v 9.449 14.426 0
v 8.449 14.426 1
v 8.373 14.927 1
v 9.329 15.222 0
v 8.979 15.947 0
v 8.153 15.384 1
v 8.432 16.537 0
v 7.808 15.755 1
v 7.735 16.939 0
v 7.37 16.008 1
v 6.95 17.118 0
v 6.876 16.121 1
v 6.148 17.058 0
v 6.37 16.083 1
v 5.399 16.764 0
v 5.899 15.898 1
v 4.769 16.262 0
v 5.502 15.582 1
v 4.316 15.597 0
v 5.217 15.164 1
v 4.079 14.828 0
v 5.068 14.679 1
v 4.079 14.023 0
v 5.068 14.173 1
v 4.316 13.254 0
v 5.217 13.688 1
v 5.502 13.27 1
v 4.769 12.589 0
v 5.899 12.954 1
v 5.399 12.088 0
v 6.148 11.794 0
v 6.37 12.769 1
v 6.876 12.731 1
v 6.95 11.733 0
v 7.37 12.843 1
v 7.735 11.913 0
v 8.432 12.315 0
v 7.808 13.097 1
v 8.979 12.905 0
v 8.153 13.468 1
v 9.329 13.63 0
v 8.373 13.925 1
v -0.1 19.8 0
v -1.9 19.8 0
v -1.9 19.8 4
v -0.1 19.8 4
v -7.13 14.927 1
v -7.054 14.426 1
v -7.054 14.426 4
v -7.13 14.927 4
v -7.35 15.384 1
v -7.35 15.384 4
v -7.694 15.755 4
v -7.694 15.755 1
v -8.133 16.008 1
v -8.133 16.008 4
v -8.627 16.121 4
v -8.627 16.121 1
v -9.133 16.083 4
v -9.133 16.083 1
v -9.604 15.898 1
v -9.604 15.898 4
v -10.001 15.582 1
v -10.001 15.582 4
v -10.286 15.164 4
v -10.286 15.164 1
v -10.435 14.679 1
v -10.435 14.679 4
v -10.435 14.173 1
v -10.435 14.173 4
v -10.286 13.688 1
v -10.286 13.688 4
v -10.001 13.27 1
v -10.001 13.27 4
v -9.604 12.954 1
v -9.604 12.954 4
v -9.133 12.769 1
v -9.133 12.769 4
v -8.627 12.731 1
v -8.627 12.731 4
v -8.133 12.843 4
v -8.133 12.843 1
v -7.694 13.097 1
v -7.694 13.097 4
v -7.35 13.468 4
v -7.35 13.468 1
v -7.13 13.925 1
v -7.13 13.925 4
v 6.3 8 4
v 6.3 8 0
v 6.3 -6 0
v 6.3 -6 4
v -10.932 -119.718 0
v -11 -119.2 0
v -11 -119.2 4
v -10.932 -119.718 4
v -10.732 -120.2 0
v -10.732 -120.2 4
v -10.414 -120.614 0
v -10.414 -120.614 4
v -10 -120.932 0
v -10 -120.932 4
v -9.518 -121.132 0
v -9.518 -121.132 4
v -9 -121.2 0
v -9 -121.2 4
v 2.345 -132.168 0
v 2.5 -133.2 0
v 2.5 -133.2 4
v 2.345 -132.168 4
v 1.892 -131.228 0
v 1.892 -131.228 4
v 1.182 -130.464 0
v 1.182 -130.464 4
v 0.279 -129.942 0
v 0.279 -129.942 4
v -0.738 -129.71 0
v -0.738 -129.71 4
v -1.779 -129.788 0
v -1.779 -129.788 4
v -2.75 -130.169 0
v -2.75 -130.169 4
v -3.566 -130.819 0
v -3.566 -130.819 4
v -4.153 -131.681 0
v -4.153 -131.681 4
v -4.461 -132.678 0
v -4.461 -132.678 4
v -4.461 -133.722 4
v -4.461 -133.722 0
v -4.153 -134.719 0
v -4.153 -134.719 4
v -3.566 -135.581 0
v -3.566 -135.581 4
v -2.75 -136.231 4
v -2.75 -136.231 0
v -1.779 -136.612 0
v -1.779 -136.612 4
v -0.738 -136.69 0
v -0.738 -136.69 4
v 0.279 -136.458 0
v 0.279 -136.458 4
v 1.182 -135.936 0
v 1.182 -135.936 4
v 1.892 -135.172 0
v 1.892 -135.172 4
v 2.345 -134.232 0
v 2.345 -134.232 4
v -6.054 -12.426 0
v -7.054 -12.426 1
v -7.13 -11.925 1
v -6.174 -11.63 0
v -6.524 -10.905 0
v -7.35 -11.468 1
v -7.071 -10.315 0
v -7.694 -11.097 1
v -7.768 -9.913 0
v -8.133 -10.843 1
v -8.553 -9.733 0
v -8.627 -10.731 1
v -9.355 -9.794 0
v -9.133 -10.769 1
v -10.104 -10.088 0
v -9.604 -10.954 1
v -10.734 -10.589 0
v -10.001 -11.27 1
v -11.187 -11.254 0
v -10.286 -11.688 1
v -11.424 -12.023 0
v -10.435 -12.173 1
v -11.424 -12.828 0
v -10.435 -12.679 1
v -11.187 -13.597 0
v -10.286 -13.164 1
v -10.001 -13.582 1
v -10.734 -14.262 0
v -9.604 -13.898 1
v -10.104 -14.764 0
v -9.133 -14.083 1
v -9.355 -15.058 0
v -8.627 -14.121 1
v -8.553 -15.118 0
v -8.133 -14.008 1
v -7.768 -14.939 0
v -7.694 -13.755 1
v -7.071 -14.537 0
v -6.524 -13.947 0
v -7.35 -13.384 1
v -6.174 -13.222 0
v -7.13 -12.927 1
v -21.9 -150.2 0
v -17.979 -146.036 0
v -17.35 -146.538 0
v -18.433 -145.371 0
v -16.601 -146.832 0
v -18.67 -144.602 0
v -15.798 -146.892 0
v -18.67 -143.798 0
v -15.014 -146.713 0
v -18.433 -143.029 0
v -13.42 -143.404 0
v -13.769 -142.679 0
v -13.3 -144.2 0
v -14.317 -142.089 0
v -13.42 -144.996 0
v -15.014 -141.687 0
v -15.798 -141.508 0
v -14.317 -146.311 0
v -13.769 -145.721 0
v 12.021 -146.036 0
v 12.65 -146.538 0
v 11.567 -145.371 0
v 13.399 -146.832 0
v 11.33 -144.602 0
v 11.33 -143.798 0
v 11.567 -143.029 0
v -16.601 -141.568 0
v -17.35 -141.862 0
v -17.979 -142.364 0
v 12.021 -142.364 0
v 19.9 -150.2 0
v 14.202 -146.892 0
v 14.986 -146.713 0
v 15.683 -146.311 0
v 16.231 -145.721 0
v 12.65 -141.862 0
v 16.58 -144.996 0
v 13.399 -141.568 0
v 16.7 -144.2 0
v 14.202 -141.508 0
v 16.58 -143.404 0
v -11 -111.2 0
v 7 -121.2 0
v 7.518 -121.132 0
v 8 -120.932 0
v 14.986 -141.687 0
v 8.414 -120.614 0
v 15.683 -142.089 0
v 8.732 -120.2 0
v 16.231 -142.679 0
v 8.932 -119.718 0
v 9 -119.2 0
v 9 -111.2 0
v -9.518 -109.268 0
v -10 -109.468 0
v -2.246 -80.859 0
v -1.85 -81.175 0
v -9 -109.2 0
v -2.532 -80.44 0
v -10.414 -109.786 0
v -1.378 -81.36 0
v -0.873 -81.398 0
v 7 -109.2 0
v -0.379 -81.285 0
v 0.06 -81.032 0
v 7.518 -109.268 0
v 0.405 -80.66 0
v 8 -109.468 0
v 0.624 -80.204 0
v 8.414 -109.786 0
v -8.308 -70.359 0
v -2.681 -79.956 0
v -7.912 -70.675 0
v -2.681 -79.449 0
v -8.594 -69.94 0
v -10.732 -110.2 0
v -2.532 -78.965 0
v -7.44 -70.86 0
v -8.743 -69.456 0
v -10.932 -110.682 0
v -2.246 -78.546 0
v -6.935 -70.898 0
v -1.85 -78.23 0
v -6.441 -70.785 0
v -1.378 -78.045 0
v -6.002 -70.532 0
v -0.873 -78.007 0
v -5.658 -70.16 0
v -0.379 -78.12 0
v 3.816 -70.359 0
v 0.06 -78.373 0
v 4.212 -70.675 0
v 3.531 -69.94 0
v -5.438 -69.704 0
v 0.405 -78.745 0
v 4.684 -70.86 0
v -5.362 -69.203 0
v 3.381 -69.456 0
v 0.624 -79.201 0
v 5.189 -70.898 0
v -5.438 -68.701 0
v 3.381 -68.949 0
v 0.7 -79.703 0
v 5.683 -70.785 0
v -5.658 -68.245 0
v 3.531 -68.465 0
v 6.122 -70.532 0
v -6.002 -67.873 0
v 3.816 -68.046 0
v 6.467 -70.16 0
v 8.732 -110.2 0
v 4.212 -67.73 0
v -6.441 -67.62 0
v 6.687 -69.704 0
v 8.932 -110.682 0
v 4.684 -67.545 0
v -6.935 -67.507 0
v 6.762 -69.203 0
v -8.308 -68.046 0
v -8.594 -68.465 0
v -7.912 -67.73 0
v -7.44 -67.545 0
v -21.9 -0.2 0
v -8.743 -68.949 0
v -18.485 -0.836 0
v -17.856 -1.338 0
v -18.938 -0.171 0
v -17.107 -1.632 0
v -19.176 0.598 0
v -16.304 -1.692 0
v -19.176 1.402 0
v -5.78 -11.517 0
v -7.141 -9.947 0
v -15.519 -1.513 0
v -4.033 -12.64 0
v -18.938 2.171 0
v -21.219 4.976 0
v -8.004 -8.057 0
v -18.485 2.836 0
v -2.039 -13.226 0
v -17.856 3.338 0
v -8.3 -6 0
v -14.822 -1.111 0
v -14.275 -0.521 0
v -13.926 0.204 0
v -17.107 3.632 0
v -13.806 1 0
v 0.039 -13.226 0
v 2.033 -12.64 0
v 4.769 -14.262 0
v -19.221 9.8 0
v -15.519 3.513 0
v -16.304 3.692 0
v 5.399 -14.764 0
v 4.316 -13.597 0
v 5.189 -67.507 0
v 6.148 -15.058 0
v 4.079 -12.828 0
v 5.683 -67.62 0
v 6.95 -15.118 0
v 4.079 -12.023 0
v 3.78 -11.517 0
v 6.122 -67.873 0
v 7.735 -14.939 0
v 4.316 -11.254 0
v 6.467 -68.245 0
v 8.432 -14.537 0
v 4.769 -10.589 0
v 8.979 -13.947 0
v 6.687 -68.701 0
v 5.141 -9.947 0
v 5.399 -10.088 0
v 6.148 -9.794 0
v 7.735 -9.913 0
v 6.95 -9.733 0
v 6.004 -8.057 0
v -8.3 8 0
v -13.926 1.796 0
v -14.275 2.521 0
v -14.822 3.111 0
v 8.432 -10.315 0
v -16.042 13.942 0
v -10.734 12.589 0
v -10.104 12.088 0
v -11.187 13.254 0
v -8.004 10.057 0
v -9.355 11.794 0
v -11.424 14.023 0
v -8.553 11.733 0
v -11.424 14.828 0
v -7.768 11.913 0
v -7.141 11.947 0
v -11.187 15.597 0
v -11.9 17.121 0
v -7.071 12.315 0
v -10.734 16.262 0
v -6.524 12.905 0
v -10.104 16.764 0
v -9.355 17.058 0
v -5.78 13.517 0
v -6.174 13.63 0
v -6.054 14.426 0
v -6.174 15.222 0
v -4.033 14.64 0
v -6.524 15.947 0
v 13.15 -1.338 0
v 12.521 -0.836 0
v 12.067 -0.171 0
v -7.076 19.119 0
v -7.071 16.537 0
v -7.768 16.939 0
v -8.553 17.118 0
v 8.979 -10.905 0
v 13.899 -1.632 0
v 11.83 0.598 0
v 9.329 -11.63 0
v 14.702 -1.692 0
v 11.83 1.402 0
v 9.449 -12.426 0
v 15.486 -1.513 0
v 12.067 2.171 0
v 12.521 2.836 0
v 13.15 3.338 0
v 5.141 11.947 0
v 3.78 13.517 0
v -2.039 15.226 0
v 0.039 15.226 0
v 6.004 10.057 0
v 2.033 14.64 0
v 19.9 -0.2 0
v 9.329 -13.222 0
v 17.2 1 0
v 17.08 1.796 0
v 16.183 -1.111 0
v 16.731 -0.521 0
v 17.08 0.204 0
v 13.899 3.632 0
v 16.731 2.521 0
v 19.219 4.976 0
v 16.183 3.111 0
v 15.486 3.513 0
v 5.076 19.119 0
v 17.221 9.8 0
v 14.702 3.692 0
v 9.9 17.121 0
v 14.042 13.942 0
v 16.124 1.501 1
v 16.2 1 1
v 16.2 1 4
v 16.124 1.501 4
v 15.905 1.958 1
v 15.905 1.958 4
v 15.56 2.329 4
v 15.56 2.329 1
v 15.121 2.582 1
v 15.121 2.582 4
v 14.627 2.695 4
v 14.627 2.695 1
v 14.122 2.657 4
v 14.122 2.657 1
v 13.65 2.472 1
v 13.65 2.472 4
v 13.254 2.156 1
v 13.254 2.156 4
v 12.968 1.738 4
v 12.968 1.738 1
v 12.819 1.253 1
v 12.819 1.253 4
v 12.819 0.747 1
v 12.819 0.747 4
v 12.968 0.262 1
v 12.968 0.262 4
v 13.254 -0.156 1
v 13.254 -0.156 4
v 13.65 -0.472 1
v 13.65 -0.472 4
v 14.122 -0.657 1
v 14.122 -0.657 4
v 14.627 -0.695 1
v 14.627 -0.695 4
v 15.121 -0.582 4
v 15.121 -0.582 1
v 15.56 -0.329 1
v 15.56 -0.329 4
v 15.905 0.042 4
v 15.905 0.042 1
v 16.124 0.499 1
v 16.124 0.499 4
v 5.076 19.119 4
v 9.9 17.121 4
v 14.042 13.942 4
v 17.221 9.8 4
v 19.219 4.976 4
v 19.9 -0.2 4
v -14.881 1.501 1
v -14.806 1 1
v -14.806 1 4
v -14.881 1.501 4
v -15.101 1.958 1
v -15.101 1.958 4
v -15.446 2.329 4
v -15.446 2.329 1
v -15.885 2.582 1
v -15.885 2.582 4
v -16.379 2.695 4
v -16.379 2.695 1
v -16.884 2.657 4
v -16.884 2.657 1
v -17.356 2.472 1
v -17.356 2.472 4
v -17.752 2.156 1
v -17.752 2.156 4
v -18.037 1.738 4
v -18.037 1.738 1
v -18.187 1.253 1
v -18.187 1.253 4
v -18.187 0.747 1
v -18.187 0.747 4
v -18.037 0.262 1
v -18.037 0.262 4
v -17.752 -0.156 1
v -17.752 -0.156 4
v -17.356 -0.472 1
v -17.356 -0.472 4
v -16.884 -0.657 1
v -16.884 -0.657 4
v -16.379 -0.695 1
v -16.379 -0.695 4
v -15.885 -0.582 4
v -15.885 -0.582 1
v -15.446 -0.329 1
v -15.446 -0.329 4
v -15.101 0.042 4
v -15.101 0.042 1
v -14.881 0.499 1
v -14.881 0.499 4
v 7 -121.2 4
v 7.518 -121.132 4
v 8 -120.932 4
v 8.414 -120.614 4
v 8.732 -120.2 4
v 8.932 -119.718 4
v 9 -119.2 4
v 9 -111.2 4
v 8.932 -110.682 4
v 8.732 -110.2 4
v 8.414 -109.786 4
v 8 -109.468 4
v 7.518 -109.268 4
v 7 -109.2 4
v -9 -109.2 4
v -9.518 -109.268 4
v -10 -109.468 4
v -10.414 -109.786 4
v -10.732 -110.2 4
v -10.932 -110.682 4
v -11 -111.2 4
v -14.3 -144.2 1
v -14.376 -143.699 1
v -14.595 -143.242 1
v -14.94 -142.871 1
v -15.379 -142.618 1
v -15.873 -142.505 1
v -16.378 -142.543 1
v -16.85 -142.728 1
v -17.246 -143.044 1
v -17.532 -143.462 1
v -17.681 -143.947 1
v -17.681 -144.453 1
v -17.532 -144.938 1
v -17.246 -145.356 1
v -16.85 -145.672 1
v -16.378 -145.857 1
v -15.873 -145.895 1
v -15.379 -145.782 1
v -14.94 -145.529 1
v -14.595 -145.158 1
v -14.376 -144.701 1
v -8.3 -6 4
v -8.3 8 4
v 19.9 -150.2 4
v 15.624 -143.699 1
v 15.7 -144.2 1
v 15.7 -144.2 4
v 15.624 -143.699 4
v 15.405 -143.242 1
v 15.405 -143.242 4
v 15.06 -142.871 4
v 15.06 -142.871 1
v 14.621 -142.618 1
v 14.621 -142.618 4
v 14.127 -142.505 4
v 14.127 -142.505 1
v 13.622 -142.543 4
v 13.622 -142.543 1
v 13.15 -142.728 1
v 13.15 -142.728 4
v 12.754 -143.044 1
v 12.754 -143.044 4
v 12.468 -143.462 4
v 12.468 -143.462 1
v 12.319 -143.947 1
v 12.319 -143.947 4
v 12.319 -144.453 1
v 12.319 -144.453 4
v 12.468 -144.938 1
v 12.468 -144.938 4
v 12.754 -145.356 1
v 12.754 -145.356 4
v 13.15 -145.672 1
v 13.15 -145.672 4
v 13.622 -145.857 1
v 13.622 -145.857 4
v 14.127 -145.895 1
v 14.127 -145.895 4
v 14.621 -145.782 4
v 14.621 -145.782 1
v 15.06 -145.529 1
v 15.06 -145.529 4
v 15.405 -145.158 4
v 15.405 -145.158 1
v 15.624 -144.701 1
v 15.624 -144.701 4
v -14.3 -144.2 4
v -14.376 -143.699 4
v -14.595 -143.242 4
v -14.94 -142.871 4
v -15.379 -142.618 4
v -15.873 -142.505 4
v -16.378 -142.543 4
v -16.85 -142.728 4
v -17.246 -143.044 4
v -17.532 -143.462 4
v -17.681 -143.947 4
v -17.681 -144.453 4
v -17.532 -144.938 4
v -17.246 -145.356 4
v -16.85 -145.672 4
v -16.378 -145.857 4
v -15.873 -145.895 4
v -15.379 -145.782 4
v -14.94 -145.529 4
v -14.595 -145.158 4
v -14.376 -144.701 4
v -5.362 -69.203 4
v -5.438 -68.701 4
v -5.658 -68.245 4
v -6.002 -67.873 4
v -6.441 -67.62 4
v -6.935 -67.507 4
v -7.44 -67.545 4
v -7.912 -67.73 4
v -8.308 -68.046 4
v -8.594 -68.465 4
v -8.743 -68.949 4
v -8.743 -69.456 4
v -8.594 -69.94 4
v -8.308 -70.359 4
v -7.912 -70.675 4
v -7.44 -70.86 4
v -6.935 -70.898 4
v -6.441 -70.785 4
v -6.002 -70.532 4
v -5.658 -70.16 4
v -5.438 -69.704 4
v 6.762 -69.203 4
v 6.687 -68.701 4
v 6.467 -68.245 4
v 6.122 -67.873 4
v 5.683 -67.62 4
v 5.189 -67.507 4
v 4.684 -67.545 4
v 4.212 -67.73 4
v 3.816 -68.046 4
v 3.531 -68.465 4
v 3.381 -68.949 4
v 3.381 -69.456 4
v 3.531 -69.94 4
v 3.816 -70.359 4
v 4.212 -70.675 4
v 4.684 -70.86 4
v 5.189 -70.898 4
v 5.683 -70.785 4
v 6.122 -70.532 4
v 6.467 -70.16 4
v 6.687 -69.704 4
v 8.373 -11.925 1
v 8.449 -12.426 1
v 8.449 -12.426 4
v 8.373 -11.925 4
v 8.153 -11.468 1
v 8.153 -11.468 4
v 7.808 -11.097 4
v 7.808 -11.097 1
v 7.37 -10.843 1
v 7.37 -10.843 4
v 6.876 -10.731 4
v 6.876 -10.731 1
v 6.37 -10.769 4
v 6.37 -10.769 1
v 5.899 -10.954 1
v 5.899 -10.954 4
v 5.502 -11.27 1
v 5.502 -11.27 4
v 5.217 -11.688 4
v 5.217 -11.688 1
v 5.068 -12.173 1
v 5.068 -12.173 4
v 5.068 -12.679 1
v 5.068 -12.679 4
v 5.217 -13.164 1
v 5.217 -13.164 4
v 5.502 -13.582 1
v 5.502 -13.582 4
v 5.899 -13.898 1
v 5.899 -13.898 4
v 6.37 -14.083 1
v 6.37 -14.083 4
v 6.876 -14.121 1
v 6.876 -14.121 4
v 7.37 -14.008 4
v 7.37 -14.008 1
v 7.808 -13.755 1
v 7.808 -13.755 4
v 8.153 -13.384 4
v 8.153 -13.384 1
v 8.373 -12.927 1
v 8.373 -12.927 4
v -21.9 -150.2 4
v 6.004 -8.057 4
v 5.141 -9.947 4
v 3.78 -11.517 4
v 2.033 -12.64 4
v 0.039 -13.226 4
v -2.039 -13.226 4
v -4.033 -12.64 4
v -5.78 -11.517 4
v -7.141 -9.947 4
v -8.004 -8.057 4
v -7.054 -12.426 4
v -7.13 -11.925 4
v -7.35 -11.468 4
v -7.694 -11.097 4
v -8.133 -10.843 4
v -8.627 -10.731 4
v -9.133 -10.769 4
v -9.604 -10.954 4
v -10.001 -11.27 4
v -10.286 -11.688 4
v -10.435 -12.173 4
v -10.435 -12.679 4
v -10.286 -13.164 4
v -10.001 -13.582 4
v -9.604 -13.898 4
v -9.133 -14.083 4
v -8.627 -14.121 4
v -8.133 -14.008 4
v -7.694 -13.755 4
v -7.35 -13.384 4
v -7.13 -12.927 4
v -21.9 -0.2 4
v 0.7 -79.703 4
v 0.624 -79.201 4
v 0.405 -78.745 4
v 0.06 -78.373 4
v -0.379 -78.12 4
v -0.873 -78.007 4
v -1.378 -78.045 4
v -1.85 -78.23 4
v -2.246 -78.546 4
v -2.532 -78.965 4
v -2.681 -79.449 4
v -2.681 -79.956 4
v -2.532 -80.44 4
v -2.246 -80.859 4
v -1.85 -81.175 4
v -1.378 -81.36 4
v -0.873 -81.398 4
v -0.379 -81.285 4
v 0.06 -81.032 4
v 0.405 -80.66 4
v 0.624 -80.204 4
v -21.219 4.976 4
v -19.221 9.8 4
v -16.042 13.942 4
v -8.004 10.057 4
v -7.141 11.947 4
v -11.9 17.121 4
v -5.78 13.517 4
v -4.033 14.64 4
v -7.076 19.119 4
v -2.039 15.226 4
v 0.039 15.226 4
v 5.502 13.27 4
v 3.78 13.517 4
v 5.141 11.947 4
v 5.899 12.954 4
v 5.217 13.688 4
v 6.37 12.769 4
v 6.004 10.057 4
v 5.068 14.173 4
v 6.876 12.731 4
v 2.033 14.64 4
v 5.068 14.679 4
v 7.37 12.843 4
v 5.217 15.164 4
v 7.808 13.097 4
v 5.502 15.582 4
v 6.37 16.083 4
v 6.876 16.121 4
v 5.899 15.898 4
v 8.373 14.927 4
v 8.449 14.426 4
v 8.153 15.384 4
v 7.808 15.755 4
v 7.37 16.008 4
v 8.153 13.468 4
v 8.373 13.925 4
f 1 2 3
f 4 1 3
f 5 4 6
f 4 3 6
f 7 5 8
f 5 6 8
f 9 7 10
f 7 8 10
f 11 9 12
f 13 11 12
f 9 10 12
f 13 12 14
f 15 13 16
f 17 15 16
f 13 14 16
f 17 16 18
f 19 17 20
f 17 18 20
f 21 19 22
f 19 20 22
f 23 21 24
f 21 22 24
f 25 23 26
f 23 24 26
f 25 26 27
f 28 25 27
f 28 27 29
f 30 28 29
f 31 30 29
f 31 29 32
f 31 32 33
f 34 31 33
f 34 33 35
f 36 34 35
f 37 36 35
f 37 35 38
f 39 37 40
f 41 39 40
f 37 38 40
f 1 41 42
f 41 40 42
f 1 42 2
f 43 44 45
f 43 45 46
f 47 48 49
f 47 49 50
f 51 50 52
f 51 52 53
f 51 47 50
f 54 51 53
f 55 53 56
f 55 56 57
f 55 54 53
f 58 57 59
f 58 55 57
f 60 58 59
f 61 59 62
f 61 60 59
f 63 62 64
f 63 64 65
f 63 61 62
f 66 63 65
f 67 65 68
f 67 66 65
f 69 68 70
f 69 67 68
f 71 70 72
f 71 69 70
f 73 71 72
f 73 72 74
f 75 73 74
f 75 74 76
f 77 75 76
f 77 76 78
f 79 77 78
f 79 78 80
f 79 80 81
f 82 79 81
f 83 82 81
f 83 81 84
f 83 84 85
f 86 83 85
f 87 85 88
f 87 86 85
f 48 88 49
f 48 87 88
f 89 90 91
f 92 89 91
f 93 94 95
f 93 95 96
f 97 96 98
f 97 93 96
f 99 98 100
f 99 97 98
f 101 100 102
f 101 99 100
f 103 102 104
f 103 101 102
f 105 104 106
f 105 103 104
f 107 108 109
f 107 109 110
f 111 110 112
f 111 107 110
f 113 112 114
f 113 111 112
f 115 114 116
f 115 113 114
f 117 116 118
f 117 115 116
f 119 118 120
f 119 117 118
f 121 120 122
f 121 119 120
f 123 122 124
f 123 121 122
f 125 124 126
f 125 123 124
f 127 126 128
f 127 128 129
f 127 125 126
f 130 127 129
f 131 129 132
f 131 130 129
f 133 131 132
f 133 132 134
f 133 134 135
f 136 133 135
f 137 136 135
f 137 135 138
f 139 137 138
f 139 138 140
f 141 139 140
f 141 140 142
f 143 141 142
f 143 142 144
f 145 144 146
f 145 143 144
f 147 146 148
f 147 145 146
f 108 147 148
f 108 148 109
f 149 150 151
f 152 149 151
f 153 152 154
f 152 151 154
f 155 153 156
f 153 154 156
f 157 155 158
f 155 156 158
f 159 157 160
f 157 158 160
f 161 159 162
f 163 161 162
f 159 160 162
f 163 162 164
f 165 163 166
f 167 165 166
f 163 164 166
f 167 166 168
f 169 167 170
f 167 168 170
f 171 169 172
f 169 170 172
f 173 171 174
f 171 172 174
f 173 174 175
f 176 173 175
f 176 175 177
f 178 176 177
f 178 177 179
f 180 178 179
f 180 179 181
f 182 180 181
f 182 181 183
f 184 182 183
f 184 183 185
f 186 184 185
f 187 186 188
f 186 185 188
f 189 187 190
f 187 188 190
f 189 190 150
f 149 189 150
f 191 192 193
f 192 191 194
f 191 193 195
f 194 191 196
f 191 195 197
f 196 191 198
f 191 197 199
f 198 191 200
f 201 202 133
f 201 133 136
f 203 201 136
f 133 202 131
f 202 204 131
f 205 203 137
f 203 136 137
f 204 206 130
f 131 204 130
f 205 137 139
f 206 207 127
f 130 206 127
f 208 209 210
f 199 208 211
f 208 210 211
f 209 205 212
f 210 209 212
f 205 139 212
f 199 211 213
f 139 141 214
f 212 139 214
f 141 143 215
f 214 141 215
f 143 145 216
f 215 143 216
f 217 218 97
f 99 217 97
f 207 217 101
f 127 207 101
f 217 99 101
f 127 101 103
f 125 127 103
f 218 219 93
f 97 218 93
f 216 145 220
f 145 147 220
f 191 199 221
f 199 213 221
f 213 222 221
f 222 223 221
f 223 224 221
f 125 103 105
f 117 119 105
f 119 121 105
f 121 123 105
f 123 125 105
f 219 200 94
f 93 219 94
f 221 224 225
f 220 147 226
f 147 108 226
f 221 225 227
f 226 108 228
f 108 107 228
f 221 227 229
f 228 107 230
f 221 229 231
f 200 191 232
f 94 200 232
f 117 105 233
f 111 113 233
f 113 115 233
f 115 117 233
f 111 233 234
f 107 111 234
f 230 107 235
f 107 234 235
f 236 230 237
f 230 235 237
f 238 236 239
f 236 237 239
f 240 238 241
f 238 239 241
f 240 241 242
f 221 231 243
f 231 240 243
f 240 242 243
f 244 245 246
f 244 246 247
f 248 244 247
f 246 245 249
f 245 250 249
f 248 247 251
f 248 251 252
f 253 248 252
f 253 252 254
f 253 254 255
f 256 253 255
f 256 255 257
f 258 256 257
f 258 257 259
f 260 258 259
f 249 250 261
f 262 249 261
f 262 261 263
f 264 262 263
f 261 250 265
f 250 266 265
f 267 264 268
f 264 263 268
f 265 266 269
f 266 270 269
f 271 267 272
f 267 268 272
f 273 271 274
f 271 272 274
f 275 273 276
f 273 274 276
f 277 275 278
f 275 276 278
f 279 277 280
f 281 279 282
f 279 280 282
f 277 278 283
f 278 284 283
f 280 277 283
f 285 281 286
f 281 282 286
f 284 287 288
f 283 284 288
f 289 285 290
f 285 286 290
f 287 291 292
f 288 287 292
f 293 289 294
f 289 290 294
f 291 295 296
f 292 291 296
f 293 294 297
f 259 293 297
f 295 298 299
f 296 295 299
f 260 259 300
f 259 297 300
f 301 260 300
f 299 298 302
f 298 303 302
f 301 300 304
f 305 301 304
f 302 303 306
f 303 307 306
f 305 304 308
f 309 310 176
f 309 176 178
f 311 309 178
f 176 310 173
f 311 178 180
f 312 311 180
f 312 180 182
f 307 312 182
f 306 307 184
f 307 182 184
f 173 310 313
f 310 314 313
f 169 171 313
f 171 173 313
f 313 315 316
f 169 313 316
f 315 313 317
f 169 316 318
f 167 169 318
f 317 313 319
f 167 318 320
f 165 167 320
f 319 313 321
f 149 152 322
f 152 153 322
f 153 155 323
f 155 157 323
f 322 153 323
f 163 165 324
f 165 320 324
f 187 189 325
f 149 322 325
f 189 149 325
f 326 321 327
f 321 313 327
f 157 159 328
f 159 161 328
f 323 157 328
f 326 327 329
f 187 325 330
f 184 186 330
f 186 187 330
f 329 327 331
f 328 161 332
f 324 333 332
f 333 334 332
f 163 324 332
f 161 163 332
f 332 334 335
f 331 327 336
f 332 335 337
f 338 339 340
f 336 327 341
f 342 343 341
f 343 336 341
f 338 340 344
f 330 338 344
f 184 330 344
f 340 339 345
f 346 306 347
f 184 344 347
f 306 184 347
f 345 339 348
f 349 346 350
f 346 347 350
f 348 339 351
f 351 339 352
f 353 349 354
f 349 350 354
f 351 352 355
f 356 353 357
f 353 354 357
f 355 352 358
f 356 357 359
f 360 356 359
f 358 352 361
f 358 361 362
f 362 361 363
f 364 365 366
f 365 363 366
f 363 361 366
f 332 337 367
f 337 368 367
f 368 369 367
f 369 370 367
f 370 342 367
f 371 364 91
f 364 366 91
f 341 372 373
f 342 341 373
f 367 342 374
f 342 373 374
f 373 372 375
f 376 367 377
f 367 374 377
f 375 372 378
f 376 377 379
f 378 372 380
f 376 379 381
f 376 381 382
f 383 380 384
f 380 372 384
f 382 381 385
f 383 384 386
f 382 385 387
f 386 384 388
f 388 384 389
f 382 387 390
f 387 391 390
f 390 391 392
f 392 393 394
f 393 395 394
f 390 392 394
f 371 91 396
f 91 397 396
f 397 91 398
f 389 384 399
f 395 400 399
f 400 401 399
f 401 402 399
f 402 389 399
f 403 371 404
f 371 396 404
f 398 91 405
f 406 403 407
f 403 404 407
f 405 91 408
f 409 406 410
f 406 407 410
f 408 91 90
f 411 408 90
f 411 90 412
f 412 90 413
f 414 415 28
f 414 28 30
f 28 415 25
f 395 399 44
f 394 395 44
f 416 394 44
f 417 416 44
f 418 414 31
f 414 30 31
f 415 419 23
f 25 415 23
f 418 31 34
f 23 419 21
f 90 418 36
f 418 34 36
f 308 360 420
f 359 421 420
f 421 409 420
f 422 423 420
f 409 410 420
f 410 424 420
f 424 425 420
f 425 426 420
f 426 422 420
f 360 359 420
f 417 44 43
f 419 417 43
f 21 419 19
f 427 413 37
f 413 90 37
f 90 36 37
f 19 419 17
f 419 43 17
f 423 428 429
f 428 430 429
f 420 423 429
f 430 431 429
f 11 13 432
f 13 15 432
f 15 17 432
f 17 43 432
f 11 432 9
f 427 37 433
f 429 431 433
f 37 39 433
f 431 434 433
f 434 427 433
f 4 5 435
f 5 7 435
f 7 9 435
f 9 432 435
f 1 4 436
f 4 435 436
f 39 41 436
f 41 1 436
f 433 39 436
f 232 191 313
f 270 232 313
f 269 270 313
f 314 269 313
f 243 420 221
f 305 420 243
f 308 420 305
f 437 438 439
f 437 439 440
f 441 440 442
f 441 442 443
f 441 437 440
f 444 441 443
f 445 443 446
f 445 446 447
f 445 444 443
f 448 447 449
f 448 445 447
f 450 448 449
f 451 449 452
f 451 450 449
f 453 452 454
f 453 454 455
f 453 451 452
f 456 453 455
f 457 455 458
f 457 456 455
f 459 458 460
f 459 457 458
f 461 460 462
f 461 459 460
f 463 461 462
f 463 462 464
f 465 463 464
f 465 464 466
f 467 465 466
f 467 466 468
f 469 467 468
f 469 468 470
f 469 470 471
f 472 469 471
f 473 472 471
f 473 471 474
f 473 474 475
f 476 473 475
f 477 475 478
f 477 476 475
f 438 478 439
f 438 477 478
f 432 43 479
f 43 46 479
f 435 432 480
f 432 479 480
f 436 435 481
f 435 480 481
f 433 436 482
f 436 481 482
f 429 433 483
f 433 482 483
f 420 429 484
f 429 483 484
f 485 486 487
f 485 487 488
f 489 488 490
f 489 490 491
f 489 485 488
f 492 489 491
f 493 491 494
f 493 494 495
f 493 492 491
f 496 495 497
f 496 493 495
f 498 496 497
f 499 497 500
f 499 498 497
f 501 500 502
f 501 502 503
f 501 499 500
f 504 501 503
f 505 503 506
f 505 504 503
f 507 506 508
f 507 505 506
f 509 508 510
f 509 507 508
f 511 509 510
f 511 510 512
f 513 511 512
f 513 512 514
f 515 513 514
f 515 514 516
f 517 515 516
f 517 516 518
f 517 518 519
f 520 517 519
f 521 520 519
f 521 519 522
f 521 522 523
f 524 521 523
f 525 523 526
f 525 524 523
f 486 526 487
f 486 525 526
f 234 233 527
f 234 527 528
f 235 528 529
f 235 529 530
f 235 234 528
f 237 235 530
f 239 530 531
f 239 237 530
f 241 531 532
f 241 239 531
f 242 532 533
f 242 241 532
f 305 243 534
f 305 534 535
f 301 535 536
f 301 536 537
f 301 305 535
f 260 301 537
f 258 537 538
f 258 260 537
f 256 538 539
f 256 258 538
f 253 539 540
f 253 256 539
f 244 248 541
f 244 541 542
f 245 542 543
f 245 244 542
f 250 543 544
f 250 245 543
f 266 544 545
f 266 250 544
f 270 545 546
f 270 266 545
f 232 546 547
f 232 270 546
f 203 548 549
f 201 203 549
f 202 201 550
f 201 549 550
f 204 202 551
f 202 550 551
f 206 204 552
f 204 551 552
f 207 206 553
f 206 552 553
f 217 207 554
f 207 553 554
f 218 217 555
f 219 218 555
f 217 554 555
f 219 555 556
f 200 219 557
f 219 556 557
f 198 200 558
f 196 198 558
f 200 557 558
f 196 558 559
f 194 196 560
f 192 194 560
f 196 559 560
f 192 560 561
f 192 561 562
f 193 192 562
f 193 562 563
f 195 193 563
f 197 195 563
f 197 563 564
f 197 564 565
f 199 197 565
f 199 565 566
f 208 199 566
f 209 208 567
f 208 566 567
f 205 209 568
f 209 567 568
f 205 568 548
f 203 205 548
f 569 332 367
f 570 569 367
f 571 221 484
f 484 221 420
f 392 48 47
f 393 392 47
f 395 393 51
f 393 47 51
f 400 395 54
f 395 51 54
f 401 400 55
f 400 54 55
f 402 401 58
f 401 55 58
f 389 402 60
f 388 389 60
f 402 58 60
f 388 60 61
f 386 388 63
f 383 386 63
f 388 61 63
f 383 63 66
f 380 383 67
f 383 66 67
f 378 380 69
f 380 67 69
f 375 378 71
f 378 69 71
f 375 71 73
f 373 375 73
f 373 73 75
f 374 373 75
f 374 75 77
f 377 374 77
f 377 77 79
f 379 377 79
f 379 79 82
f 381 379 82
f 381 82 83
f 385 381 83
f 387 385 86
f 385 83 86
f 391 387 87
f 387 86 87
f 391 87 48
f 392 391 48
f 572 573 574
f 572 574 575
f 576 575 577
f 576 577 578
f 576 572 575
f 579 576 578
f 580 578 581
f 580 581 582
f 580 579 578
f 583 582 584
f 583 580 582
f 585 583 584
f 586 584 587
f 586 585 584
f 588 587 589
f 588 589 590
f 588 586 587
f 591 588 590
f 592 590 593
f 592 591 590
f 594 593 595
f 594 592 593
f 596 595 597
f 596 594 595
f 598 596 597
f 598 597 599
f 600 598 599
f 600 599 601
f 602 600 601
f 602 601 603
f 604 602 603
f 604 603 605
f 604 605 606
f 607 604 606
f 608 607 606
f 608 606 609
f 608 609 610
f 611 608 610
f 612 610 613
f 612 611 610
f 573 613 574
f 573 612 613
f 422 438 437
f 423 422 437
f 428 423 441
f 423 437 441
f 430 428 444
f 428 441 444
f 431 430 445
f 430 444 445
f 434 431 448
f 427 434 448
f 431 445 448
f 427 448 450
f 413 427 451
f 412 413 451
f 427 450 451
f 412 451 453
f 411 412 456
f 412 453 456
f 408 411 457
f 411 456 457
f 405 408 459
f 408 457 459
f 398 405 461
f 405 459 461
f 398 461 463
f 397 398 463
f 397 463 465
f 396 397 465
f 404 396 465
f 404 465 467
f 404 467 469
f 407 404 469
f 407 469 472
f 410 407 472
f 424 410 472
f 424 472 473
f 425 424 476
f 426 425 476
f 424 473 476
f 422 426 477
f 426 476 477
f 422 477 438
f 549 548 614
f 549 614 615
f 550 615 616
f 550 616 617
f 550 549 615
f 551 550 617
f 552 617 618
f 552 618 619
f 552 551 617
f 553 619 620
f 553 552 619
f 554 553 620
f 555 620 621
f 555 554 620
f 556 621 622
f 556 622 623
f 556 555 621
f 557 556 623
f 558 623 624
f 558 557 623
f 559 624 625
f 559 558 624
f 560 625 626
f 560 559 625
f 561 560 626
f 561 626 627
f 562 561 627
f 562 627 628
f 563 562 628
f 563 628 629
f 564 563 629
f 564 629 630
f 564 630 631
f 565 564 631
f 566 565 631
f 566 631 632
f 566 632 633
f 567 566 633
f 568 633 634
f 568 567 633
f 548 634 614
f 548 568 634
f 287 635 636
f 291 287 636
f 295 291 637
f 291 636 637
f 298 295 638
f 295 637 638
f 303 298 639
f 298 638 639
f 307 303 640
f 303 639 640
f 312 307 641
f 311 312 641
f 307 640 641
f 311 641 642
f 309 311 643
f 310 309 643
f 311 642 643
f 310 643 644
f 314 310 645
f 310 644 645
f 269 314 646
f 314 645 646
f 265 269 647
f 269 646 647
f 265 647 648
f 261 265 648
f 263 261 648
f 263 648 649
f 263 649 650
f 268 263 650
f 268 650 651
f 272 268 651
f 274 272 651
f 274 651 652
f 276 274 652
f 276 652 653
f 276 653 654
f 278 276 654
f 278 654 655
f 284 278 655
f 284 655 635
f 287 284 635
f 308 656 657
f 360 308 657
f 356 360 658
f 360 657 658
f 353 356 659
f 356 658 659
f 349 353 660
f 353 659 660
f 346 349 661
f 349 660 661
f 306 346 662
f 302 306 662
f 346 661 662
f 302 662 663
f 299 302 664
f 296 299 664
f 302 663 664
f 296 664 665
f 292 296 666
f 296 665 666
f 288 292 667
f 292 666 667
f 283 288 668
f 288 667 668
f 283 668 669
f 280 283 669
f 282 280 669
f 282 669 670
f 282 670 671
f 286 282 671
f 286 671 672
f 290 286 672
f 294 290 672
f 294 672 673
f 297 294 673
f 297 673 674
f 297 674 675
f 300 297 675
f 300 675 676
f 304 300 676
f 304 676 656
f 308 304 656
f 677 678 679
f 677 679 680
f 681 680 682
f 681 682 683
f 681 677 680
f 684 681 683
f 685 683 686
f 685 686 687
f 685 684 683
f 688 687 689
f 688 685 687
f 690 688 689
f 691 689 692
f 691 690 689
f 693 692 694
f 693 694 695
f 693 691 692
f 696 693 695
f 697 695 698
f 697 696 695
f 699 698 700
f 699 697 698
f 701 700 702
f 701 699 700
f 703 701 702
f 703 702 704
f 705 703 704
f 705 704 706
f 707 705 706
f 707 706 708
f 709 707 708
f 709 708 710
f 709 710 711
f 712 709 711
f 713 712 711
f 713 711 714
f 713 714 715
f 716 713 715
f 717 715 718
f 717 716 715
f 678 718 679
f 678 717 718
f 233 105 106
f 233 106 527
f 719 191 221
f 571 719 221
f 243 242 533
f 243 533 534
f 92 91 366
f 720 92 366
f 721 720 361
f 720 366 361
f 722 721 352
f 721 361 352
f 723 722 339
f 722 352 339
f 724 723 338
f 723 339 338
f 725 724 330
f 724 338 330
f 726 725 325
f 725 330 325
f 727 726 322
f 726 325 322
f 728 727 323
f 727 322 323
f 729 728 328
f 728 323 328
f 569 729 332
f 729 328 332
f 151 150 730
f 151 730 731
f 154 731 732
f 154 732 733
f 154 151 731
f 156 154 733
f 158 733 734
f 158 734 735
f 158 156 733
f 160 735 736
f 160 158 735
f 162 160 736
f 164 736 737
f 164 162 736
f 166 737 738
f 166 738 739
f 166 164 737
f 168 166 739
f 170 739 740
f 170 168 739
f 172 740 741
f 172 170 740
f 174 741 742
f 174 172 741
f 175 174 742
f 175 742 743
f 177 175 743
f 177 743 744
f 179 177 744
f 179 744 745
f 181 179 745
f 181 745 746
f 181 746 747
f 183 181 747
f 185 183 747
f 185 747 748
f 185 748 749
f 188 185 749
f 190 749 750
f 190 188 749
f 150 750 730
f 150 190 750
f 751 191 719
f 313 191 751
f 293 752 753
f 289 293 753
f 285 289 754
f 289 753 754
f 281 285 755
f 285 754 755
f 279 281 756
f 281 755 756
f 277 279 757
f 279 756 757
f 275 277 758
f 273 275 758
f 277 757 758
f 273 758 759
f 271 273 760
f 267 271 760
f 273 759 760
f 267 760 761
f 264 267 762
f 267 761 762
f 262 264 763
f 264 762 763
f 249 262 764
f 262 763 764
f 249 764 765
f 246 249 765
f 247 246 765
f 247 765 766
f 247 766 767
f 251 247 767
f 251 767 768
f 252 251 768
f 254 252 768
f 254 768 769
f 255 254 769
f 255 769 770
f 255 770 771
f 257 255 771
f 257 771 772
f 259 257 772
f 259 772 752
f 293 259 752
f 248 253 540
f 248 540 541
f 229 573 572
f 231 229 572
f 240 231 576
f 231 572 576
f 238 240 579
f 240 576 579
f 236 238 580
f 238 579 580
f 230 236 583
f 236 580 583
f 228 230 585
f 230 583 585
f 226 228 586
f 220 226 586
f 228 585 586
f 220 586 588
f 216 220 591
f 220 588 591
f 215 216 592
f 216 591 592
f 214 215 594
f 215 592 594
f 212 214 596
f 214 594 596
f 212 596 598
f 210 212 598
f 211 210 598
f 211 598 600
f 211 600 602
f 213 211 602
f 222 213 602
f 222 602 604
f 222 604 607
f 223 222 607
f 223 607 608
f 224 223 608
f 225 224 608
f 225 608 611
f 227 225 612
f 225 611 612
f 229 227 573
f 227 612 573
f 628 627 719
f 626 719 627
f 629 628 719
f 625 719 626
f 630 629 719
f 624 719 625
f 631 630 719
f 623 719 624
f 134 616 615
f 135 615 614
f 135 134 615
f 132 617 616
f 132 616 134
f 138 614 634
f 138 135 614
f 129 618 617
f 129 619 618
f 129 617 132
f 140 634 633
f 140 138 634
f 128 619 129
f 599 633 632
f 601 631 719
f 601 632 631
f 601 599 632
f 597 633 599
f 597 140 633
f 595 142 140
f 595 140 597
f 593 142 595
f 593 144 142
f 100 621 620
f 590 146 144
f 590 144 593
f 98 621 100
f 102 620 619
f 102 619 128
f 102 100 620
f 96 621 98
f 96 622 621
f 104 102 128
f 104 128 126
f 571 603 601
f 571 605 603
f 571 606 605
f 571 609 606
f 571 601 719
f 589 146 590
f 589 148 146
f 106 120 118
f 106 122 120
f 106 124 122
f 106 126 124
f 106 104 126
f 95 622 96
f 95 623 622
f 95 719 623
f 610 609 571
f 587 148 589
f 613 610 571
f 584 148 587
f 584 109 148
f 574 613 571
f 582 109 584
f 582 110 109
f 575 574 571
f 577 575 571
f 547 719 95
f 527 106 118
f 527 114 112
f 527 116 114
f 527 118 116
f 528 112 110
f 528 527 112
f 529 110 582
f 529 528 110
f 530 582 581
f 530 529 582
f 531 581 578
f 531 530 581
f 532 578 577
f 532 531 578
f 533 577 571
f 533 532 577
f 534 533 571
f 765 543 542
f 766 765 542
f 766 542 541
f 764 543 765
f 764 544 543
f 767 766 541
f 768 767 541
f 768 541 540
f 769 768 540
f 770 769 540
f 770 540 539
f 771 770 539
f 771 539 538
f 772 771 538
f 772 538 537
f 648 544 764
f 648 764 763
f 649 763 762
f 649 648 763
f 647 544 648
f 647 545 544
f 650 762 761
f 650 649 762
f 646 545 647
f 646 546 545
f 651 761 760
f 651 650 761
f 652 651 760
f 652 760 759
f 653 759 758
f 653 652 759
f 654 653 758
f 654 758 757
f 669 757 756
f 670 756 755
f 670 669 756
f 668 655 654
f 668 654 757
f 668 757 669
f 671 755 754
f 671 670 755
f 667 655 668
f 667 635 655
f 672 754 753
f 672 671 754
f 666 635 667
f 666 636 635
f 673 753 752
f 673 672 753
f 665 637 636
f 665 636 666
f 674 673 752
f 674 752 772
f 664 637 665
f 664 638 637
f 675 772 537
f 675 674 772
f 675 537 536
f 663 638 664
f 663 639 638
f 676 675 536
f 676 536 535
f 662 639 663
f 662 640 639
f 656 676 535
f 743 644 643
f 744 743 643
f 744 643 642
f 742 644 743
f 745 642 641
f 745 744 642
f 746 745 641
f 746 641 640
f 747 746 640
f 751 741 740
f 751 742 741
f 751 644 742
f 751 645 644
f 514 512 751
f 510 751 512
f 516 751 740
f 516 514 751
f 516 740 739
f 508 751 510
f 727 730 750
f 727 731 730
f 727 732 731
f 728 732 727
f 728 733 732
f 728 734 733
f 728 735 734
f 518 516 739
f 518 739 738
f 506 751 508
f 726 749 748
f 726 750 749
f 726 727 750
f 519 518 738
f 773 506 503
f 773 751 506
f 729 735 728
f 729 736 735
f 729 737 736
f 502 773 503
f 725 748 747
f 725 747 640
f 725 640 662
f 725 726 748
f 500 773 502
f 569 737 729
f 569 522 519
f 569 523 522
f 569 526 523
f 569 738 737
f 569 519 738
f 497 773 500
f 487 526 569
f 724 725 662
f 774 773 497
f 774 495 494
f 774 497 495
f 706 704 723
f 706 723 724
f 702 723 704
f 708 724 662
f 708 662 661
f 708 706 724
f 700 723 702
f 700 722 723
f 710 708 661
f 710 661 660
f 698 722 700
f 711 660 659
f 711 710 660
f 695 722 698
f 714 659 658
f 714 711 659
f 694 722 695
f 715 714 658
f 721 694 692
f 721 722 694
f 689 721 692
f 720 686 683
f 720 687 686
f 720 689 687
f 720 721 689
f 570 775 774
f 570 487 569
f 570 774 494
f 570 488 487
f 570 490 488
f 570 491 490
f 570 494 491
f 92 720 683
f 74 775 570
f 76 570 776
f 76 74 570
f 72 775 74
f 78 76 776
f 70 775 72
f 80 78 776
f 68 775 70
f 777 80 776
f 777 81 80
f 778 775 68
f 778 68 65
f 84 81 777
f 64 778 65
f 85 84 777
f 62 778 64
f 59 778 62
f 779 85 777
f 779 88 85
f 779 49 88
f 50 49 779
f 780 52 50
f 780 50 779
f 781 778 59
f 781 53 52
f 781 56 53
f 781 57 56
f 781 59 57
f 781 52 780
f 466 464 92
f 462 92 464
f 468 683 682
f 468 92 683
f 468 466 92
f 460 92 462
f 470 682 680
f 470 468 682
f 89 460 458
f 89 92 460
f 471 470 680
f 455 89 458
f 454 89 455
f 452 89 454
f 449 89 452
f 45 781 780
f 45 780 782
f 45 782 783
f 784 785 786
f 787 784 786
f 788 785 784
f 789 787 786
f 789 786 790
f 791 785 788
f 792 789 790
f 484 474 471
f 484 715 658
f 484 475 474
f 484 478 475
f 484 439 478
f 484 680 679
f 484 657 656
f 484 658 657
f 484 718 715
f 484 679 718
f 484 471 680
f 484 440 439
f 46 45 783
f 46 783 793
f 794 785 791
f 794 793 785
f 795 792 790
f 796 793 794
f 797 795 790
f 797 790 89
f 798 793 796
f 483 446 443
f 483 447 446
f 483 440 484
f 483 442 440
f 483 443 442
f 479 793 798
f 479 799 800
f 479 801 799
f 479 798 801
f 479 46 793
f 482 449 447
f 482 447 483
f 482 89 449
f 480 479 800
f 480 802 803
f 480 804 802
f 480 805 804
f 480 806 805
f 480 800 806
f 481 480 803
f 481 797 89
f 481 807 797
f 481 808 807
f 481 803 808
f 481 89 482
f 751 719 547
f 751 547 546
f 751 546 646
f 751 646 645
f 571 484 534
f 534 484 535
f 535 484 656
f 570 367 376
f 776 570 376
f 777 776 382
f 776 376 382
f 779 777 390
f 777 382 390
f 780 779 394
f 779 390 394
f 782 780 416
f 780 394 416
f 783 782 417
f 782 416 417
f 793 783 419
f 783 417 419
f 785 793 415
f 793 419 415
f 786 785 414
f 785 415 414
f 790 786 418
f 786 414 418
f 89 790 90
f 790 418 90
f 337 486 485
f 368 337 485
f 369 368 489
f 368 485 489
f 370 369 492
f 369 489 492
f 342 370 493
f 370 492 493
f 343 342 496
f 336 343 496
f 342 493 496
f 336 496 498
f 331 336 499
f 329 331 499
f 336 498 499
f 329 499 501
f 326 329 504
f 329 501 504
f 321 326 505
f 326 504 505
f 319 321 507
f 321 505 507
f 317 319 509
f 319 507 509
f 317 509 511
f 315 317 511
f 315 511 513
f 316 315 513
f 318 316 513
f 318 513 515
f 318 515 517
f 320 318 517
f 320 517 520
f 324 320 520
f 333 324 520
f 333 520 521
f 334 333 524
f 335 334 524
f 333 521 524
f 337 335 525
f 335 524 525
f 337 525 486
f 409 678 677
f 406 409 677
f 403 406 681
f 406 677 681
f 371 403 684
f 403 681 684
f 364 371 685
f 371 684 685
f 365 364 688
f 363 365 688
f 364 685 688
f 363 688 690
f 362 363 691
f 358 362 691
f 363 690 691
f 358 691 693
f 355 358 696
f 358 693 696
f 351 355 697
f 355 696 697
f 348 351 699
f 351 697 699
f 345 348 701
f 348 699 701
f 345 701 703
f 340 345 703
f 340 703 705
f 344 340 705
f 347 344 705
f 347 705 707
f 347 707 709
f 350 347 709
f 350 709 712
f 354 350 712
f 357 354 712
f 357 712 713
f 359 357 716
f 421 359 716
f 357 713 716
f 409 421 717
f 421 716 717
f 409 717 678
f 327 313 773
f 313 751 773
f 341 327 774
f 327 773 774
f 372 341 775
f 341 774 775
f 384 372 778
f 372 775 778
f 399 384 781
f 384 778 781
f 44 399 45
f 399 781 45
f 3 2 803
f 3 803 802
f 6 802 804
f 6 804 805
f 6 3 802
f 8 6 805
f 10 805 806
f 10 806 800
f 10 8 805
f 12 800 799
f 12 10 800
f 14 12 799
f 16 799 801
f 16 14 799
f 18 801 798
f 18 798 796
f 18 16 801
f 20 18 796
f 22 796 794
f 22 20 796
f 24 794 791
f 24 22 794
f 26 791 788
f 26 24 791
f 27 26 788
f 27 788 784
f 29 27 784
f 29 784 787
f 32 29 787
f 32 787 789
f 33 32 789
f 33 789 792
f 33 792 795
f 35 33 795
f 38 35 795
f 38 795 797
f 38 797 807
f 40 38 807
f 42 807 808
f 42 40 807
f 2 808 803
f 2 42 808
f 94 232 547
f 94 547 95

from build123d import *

# Parameters (mm, degrees)
SKETCH1_W           = 41.8
SKETCH1_H           = 170
SKETCH1_R           = 1.7
SKETCH1_R_2         = 3.5
BOSS_EXTRUDE1_DEPTH = 4
FILLET1_R           = 20
SKETCH2_R           = 1.7
DEPENDANT_DEPTH     = 10
CHAMFER1_SIZE       = 1


with BuildPart() as part:
    # Sketch1 → Boss-Extrude1 (new body)
    with BuildSketch(Plane.XY):
        with Locations((-1, -65.2)):
            Rectangle(SKETCH1_W, SKETCH1_H)
        with Locations((6.748548523, -12.425907791)):
            Circle(SKETCH1_R, mode=Mode.SUBTRACT)
        with Locations((-8.754354431, -12.425907791)):
            Circle(SKETCH1_R, mode=Mode.SUBTRACT)
        with Locations((-16.505805908, 1)):
            Circle(SKETCH1_R, mode=Mode.SUBTRACT)
        with Locations((-8.754354431, 14.425907791)):
            Circle(SKETCH1_R, mode=Mode.SUBTRACT)
        with Locations((6.748548523, 14.425907791)):
            Circle(SKETCH1_R, mode=Mode.SUBTRACT)
        with Locations((14.5, 1)):
            Circle(SKETCH1_R, mode=Mode.SUBTRACT)
        with Locations((14, -144.2)):
            Circle(SKETCH1_R, mode=Mode.SUBTRACT)
        with Locations((-16, -144.2)):
            Circle(SKETCH1_R, mode=Mode.SUBTRACT)
        with Locations((-1, -133.2)):
            Circle(SKETCH1_R_2, mode=Mode.SUBTRACT)
        with BuildLine():
            Line((6.3, 8), (6.3, -6))
            ThreePointArc((6.3, -6), (-1, -13.3), (-8.3, -6))
            Line((-8.3, -6), (-8.3, 8))
            ThreePointArc((-8.3, 8), (-1, 15.3), (6.3, 8))
        make_face(mode=Mode.SUBTRACT)
        with BuildLine():
            Line((-9, -121.2), (7, -121.2))
            ThreePointArc((7, -121.2), (8.414213562, -120.614213562), (9, -119.2))
            Line((9, -119.2), (9, -111.2))
            ThreePointArc((9, -111.2), (8.414213562, -109.785786438), (7, -109.2))
            Line((7, -109.2), (-9, -109.2))
            ThreePointArc((-9, -109.2), (-10.414213562, -109.785786438), (-11, -111.2))
            Line((-11, -111.2), (-11, -119.2))
            ThreePointArc((-11, -119.2), (-10.414213562, -120.614213562), (-9, -121.2))
        make_face(mode=Mode.SUBTRACT)
    extrude(amount=BOSS_EXTRUDE1_DEPTH)

    # Fillet1
    fillet1_edges = [part.edges().sort_by_distance(p)[0] for p in [
        (-21.9, 19.8, 2),
        (19.9, 19.8, 2),
    ]]
    fillet(fillet1_edges, radius=FILLET1_R)

    # Sketch2 → dependant (cut)
    with BuildSketch(Plane.XY.offset(4)):
        with Locations((-1, -79.702564777)):
            Circle(SKETCH2_R)
        with Locations((5.062177826, -69.202564777)):
            Circle(SKETCH2_R)
        with Locations((-7.062177826, -69.202564777)):
            Circle(SKETCH2_R)
    extrude(amount=-DEPENDANT_DEPTH, mode=Mode.SUBTRACT)

    # Chamfer1
    chamfer1_edges = [part.edges().sort_by_distance(p)[0] for p in [
        (5.048548523, -12.425907791, 0),
        (-10.454354431, -12.425907791, 0),
        (-18.205805908, 1, 0),
        (-10.454354431, 14.425907791, 0),
        (5.048548523, 14.425907791, 0),
        (12.8, 1, 0),
        (12.3, -144.2, 0),
        (-17.7, -144.2, 0),
    ]]
    chamfer(chamfer1_edges, length=CHAMFER1_SIZE)


solid = part.part
